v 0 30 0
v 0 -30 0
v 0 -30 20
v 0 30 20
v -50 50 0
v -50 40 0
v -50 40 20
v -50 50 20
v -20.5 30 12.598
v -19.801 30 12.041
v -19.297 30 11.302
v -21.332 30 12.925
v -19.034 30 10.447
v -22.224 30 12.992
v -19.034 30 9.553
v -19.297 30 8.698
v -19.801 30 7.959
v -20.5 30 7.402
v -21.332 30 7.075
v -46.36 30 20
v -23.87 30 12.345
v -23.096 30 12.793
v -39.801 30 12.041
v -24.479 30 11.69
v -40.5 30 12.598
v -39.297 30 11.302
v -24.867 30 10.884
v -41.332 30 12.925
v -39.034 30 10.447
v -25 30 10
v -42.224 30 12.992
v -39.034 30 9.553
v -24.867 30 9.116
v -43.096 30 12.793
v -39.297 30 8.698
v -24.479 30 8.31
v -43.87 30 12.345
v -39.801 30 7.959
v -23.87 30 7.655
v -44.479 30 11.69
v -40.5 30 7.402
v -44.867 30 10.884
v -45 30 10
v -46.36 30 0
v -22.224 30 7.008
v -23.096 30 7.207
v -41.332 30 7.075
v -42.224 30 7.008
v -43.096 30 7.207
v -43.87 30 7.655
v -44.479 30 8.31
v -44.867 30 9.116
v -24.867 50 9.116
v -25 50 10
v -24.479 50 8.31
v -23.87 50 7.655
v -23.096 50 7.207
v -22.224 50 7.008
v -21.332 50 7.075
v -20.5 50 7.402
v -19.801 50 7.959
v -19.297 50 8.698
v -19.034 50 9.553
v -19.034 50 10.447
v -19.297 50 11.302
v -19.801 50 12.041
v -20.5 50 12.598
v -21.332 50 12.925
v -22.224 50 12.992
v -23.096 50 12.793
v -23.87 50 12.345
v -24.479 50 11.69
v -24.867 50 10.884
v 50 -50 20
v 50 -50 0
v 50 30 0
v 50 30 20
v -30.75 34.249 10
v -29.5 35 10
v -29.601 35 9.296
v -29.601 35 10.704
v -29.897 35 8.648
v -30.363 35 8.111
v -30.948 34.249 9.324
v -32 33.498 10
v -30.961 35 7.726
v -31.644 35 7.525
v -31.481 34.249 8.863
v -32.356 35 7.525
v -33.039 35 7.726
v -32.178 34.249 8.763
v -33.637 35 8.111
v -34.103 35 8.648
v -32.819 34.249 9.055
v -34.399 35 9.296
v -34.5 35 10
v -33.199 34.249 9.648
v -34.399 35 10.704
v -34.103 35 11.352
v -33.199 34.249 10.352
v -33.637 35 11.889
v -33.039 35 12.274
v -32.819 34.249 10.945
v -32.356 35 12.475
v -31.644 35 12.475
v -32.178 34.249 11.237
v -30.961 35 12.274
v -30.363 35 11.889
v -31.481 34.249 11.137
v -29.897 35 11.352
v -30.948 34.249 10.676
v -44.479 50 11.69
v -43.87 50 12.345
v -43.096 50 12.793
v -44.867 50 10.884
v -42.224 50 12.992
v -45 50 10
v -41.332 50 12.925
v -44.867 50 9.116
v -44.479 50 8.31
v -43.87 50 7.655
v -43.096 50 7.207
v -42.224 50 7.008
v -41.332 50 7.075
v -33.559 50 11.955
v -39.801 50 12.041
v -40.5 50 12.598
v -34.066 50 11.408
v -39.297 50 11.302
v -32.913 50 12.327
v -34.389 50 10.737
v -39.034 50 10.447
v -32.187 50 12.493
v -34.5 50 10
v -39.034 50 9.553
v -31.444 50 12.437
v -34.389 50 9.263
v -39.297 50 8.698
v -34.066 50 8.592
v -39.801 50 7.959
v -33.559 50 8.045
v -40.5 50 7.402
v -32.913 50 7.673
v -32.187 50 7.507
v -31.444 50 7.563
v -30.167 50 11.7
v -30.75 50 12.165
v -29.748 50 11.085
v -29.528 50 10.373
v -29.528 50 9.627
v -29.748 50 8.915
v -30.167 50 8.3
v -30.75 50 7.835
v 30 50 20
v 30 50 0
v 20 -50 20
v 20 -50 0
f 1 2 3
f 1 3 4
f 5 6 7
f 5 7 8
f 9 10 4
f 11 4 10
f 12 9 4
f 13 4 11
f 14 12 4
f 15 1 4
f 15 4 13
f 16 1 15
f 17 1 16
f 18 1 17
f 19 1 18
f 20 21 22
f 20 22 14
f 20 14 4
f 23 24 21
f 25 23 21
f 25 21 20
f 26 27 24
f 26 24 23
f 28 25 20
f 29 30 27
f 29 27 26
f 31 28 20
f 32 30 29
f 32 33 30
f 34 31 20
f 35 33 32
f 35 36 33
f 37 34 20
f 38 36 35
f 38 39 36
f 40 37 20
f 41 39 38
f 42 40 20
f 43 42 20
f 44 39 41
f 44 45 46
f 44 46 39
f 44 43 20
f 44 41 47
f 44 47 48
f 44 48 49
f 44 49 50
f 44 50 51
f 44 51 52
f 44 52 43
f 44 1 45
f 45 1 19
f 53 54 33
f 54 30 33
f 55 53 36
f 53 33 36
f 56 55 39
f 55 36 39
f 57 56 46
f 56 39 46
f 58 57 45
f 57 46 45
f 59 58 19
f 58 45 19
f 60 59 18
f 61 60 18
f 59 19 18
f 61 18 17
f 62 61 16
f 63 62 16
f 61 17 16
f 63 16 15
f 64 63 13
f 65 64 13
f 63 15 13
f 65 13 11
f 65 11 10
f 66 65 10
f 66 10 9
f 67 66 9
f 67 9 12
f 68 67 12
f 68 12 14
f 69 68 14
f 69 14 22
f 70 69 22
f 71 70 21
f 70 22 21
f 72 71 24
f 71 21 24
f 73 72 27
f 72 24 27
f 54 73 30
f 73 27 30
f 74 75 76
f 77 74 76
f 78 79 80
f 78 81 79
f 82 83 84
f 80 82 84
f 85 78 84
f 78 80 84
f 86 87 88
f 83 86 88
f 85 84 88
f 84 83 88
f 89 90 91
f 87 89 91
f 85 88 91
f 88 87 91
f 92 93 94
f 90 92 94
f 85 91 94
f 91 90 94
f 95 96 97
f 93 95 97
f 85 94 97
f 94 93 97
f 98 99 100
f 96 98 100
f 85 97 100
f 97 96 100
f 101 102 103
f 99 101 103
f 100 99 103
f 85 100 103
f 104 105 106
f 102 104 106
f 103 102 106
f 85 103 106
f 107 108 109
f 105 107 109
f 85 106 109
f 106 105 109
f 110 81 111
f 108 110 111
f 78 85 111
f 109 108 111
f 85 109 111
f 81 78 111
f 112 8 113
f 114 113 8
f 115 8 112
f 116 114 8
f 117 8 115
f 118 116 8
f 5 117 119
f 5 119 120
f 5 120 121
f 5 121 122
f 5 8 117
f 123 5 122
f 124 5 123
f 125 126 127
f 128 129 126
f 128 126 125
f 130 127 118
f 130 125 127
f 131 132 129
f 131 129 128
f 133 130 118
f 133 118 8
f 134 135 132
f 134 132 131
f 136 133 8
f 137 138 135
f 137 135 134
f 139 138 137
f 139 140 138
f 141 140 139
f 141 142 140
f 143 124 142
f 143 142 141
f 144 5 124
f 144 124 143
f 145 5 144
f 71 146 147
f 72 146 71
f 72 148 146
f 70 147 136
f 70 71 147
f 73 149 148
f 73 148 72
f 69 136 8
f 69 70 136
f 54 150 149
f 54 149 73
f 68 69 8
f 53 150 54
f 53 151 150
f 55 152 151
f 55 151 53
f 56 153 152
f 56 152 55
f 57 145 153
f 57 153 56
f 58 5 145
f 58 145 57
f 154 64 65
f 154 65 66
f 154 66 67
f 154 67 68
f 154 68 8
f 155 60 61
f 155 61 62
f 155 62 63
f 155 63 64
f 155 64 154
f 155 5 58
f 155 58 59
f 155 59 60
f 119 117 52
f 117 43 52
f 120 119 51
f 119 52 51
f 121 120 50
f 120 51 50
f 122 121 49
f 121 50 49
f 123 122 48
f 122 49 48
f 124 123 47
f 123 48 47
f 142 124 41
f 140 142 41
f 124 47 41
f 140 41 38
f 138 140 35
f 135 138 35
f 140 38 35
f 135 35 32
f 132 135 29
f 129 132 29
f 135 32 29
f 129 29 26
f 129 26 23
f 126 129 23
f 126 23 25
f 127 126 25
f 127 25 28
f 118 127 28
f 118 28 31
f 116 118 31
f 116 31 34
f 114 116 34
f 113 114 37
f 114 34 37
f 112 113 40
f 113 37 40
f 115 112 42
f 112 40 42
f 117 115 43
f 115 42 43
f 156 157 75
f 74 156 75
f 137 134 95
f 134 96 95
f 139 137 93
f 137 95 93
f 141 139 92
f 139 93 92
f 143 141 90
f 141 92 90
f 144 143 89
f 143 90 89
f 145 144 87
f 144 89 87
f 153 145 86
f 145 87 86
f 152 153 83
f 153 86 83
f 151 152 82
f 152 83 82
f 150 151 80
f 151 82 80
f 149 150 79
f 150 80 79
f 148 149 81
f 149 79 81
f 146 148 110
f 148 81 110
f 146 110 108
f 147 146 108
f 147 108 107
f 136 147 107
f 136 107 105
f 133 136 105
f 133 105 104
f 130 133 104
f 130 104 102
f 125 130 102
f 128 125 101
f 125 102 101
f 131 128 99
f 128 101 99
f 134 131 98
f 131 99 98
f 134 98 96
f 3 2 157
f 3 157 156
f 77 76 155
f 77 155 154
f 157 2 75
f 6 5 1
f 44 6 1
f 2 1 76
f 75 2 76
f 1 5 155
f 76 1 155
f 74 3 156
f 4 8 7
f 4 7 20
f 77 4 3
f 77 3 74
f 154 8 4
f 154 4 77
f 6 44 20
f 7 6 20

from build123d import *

# Parameters (mm, degrees)
SKETCH_1_W             = 100
SKETCH_1_H             = 100
EXTRUDE_1_DEPTH        = 20
MM_1_D                 = 6
MM_1_DEPTH             = 20
MM_1_TIP               = 1.802581857
HOLE_WIZARD_M6_1_D     = 5
HOLE_WIZARD_M6_1_DEPTH = 15
HOLE_WIZARD_M6_1_TIP   = 1.502151548
SKETCH_6_W             = 50
SKETCH_6_H             = 80
CUT_EXTRUDE_1_DEPTH    = 74.484692283
CHAMFER_1_SIZE         = 10
CHAMFER_1_SIZE2        = 3.639702343
CHAMFER_2_SIZE         = 20
CHAMFER_3_SIZE         = 20


with BuildPart() as part:
    # 草图1 → 凸台-拉伸1 (new body)
    with BuildSketch(Plane.XY):
        Rectangle(SKETCH_1_W, SKETCH_1_H)
    extrude(amount=EXTRUDE_1_DEPTH)

    # 大小mm 暗销孔1
    with Locations(Plane(origin=(0, 50, 0), x_dir=(1, 0, 0), z_dir=(0, 1, 0))):
        with Locations((-22, -10), (-42, -10)):
            Hole(MM_1_D / 2, depth=MM_1_DEPTH)
            with Locations((0, 0, -(MM_1_DEPTH + MM_1_TIP / 2))):  # 118° drill point
                Cone(0, MM_1_D / 2, MM_1_TIP, mode=Mode.SUBTRACT)

    # M6 螺纹孔1
    with Locations(Plane(origin=(0, 50, 0), x_dir=(1, 0, 0), z_dir=(0, 1, 0))):
        with Locations((-32, -10)):
            Hole(HOLE_WIZARD_M6_1_D / 2, depth=HOLE_WIZARD_M6_1_DEPTH)
            with Locations((0, 0, -(HOLE_WIZARD_M6_1_DEPTH + HOLE_WIZARD_M6_1_TIP / 2))):  # 118° drill point
                Cone(0, HOLE_WIZARD_M6_1_D / 2, HOLE_WIZARD_M6_1_TIP, mode=Mode.SUBTRACT)

    # 草图6 → 切除-拉伸1 (cut, through all)
    with BuildSketch(Plane(origin=(0, 0, 0), x_dir=(-1, 0, 0), z_dir=(0, 0, -1))):
        with Locations((25, -10)):
            Rectangle(SKETCH_6_W, SKETCH_6_H)
    extrude(amount=-CUT_EXTRUDE_1_DEPTH, mode=Mode.SUBTRACT)

    # 倒角1
    chamfer_1_edges = [part.edges().sort_by_distance(p)[0] for p in [
        (-50, 30, 10),
    ]]
    chamfer_1_side = [part.faces().sort_by_distance(p)[0] for p in [
        (-50, 40, 10),
    ]]
    chamfer(chamfer_1_edges, length=CHAMFER_1_SIZE, length2=CHAMFER_1_SIZE2, reference=chamfer_1_side[0])

    # 倒角2
    chamfer_2_edges = [part.edges().sort_by_distance(p)[0] for p in [
        (0, -50, 10),
    ]]
    chamfer(chamfer_2_edges, length=CHAMFER_2_SIZE)

    # 倒角3
    chamfer_3_edges = [part.edges().sort_by_distance(p)[0] for p in [
        (50, 50, 10),
    ]]
    chamfer(chamfer_3_edges, length=CHAMFER_3_SIZE)


solid = part.part
